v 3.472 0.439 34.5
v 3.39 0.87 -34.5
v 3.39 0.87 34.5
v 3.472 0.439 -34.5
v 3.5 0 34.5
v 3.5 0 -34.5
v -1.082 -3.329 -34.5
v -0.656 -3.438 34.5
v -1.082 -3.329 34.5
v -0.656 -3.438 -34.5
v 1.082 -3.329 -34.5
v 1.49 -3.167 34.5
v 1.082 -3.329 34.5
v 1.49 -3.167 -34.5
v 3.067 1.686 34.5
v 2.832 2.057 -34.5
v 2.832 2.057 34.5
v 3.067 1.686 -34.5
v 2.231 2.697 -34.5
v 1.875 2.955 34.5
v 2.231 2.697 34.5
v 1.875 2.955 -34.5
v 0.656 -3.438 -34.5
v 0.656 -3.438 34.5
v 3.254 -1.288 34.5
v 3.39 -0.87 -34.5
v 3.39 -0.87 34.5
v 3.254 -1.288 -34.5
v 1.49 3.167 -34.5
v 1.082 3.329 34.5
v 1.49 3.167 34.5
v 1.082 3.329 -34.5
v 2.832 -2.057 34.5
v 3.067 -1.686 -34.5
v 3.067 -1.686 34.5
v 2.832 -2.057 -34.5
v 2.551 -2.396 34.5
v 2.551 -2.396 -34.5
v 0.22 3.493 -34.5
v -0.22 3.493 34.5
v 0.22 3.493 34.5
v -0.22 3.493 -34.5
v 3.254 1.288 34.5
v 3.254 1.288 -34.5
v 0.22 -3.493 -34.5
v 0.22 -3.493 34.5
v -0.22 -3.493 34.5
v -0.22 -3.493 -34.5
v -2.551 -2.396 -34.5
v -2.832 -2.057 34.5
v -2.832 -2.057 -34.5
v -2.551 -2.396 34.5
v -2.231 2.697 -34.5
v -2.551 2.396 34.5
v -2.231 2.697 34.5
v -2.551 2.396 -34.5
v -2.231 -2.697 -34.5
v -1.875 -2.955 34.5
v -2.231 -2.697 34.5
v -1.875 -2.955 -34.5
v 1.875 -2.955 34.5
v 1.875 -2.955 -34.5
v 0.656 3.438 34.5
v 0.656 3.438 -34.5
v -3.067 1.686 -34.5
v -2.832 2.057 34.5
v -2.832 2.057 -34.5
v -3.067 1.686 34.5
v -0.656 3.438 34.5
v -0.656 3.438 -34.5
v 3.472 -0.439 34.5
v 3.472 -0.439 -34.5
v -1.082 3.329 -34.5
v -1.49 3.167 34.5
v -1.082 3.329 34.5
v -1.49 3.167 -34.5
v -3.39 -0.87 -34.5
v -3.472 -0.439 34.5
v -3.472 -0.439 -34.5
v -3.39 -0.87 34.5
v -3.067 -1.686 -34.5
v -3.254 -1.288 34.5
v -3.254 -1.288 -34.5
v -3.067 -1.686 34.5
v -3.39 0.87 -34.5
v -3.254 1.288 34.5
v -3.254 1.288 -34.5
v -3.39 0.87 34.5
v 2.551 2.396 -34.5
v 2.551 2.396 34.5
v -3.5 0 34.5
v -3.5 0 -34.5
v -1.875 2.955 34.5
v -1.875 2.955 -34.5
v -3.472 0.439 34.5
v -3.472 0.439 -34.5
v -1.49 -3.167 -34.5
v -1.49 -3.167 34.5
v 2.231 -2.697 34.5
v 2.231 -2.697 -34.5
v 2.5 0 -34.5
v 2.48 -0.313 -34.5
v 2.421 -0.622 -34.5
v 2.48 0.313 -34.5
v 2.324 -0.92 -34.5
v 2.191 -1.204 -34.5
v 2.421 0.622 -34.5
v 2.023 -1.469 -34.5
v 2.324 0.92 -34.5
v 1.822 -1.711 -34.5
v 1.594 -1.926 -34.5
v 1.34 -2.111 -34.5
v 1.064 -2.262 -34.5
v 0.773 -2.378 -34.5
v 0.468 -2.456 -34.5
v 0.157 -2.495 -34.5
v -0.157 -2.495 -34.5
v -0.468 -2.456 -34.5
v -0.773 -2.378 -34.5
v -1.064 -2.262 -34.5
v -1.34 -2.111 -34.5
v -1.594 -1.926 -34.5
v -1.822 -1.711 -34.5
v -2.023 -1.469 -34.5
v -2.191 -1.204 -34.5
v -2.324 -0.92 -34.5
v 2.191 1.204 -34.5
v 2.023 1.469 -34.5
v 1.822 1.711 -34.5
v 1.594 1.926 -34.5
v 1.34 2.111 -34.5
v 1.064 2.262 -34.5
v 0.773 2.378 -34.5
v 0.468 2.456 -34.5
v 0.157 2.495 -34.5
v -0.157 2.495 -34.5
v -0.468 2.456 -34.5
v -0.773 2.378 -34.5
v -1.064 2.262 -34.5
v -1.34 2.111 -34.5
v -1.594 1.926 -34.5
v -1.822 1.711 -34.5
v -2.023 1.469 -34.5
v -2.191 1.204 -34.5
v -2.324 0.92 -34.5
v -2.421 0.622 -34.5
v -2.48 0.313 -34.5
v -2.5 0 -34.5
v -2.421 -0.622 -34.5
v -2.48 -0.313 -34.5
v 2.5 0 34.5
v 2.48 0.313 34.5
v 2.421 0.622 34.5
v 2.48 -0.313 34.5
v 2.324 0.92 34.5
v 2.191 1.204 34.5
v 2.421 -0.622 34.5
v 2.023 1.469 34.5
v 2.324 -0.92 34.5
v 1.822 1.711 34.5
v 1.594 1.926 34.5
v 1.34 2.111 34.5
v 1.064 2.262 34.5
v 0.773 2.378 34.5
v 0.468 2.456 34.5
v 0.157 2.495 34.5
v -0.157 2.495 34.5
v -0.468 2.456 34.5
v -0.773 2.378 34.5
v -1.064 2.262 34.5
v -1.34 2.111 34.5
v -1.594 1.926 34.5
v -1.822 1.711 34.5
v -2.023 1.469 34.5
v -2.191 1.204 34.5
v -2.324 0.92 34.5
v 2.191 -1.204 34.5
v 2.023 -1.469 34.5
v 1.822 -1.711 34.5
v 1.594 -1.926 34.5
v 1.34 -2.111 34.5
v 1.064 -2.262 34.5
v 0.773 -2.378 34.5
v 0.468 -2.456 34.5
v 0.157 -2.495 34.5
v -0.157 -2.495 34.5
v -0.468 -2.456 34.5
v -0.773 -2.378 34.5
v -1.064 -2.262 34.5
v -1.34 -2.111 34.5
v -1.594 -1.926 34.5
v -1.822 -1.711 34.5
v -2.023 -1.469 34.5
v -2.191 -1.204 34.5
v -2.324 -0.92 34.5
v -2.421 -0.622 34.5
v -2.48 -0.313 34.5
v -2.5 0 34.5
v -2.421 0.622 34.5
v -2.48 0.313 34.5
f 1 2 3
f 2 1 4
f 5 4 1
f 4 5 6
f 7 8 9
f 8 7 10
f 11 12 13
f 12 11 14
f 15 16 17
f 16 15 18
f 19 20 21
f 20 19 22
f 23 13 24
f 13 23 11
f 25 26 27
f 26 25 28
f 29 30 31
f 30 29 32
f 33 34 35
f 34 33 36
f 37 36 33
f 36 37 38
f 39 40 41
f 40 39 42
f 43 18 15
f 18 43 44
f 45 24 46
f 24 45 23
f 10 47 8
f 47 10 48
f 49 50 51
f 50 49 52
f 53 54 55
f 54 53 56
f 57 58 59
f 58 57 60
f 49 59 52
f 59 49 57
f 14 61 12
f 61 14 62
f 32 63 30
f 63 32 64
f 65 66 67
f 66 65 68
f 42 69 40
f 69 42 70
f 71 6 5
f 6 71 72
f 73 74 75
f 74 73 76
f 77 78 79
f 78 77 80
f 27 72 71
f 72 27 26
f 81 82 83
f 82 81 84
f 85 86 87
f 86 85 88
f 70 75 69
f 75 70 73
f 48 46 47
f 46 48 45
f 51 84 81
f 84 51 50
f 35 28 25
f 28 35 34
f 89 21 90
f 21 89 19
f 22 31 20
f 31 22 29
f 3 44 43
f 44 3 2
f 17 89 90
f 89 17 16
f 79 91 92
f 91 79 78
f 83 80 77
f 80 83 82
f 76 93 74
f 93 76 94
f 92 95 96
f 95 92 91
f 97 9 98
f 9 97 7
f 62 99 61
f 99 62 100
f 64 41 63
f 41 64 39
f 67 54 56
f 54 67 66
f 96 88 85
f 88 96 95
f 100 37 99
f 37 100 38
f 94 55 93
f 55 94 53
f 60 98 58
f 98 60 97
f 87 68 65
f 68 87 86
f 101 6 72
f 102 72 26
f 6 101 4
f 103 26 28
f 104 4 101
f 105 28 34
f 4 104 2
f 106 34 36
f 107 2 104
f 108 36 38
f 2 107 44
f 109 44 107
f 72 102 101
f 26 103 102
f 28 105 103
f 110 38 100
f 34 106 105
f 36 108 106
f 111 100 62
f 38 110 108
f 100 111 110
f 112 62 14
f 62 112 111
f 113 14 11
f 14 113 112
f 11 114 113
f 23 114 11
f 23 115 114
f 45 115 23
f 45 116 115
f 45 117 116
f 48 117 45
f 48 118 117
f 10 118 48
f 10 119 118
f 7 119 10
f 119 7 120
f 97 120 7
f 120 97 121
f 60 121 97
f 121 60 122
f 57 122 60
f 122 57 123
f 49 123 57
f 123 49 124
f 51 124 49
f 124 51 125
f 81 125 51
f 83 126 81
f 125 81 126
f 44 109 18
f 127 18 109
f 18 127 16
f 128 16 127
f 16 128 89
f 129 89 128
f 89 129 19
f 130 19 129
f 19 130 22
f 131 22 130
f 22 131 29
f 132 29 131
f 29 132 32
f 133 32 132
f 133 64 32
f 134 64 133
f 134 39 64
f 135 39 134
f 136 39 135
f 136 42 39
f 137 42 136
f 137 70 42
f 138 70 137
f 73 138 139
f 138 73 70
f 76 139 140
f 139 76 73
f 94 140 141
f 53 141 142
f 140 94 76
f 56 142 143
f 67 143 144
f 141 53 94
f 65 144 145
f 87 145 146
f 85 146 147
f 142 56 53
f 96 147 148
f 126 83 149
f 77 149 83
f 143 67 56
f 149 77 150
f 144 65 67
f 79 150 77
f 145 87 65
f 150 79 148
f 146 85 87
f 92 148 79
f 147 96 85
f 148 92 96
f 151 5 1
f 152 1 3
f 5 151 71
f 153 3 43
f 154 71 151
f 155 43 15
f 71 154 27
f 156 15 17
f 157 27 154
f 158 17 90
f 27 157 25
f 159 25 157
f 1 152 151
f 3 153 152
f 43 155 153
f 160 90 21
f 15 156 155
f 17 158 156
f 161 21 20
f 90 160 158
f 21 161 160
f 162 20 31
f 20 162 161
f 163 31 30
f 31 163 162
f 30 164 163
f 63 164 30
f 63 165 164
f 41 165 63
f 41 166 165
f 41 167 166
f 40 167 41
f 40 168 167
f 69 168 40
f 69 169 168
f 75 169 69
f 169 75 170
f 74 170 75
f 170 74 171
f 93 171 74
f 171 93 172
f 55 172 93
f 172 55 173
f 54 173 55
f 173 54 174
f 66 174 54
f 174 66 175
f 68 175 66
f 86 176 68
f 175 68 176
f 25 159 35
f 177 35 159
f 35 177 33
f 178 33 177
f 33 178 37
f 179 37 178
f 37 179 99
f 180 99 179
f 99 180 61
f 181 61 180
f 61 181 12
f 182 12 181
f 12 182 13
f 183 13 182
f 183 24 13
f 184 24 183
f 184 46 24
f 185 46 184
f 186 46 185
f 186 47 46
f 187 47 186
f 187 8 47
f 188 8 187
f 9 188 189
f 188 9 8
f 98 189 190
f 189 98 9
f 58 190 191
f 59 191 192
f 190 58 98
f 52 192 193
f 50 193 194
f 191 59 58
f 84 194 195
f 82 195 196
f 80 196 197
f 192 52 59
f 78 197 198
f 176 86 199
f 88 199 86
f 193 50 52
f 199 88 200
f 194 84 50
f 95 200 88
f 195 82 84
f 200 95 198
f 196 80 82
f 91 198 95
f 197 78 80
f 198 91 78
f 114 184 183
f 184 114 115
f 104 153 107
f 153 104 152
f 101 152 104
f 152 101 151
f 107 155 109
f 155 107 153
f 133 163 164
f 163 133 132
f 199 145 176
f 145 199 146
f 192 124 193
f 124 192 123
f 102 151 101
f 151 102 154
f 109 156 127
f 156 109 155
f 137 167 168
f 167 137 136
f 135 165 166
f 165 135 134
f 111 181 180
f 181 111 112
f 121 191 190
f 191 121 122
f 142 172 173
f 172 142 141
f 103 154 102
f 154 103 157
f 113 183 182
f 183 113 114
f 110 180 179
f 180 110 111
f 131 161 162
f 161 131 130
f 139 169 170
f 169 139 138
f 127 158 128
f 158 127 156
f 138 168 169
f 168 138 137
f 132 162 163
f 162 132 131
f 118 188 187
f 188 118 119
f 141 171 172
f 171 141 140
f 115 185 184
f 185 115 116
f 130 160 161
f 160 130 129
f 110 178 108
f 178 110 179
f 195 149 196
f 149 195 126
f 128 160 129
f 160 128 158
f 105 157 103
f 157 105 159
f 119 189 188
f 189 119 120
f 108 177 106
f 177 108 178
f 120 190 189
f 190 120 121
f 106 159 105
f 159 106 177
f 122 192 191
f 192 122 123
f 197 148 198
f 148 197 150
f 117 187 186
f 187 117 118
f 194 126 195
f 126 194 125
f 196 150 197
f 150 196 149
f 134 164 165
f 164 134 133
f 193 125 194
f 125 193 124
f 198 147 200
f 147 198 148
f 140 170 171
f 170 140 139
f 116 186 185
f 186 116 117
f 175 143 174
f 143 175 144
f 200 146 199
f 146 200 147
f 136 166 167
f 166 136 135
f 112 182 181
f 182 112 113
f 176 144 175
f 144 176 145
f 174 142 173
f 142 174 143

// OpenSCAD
$fn = 50;


difference() {
	union() {
		translate(v = [0, 0, -34.5000000000]) {
			cylinder(h = 69, r = 3.5000000000);
		}
	}
	union() {
		translate(v = [0, 0, -100.0000000000]) {
			cylinder(h = 200, r = 2.5000000000);
		}
	}
}
